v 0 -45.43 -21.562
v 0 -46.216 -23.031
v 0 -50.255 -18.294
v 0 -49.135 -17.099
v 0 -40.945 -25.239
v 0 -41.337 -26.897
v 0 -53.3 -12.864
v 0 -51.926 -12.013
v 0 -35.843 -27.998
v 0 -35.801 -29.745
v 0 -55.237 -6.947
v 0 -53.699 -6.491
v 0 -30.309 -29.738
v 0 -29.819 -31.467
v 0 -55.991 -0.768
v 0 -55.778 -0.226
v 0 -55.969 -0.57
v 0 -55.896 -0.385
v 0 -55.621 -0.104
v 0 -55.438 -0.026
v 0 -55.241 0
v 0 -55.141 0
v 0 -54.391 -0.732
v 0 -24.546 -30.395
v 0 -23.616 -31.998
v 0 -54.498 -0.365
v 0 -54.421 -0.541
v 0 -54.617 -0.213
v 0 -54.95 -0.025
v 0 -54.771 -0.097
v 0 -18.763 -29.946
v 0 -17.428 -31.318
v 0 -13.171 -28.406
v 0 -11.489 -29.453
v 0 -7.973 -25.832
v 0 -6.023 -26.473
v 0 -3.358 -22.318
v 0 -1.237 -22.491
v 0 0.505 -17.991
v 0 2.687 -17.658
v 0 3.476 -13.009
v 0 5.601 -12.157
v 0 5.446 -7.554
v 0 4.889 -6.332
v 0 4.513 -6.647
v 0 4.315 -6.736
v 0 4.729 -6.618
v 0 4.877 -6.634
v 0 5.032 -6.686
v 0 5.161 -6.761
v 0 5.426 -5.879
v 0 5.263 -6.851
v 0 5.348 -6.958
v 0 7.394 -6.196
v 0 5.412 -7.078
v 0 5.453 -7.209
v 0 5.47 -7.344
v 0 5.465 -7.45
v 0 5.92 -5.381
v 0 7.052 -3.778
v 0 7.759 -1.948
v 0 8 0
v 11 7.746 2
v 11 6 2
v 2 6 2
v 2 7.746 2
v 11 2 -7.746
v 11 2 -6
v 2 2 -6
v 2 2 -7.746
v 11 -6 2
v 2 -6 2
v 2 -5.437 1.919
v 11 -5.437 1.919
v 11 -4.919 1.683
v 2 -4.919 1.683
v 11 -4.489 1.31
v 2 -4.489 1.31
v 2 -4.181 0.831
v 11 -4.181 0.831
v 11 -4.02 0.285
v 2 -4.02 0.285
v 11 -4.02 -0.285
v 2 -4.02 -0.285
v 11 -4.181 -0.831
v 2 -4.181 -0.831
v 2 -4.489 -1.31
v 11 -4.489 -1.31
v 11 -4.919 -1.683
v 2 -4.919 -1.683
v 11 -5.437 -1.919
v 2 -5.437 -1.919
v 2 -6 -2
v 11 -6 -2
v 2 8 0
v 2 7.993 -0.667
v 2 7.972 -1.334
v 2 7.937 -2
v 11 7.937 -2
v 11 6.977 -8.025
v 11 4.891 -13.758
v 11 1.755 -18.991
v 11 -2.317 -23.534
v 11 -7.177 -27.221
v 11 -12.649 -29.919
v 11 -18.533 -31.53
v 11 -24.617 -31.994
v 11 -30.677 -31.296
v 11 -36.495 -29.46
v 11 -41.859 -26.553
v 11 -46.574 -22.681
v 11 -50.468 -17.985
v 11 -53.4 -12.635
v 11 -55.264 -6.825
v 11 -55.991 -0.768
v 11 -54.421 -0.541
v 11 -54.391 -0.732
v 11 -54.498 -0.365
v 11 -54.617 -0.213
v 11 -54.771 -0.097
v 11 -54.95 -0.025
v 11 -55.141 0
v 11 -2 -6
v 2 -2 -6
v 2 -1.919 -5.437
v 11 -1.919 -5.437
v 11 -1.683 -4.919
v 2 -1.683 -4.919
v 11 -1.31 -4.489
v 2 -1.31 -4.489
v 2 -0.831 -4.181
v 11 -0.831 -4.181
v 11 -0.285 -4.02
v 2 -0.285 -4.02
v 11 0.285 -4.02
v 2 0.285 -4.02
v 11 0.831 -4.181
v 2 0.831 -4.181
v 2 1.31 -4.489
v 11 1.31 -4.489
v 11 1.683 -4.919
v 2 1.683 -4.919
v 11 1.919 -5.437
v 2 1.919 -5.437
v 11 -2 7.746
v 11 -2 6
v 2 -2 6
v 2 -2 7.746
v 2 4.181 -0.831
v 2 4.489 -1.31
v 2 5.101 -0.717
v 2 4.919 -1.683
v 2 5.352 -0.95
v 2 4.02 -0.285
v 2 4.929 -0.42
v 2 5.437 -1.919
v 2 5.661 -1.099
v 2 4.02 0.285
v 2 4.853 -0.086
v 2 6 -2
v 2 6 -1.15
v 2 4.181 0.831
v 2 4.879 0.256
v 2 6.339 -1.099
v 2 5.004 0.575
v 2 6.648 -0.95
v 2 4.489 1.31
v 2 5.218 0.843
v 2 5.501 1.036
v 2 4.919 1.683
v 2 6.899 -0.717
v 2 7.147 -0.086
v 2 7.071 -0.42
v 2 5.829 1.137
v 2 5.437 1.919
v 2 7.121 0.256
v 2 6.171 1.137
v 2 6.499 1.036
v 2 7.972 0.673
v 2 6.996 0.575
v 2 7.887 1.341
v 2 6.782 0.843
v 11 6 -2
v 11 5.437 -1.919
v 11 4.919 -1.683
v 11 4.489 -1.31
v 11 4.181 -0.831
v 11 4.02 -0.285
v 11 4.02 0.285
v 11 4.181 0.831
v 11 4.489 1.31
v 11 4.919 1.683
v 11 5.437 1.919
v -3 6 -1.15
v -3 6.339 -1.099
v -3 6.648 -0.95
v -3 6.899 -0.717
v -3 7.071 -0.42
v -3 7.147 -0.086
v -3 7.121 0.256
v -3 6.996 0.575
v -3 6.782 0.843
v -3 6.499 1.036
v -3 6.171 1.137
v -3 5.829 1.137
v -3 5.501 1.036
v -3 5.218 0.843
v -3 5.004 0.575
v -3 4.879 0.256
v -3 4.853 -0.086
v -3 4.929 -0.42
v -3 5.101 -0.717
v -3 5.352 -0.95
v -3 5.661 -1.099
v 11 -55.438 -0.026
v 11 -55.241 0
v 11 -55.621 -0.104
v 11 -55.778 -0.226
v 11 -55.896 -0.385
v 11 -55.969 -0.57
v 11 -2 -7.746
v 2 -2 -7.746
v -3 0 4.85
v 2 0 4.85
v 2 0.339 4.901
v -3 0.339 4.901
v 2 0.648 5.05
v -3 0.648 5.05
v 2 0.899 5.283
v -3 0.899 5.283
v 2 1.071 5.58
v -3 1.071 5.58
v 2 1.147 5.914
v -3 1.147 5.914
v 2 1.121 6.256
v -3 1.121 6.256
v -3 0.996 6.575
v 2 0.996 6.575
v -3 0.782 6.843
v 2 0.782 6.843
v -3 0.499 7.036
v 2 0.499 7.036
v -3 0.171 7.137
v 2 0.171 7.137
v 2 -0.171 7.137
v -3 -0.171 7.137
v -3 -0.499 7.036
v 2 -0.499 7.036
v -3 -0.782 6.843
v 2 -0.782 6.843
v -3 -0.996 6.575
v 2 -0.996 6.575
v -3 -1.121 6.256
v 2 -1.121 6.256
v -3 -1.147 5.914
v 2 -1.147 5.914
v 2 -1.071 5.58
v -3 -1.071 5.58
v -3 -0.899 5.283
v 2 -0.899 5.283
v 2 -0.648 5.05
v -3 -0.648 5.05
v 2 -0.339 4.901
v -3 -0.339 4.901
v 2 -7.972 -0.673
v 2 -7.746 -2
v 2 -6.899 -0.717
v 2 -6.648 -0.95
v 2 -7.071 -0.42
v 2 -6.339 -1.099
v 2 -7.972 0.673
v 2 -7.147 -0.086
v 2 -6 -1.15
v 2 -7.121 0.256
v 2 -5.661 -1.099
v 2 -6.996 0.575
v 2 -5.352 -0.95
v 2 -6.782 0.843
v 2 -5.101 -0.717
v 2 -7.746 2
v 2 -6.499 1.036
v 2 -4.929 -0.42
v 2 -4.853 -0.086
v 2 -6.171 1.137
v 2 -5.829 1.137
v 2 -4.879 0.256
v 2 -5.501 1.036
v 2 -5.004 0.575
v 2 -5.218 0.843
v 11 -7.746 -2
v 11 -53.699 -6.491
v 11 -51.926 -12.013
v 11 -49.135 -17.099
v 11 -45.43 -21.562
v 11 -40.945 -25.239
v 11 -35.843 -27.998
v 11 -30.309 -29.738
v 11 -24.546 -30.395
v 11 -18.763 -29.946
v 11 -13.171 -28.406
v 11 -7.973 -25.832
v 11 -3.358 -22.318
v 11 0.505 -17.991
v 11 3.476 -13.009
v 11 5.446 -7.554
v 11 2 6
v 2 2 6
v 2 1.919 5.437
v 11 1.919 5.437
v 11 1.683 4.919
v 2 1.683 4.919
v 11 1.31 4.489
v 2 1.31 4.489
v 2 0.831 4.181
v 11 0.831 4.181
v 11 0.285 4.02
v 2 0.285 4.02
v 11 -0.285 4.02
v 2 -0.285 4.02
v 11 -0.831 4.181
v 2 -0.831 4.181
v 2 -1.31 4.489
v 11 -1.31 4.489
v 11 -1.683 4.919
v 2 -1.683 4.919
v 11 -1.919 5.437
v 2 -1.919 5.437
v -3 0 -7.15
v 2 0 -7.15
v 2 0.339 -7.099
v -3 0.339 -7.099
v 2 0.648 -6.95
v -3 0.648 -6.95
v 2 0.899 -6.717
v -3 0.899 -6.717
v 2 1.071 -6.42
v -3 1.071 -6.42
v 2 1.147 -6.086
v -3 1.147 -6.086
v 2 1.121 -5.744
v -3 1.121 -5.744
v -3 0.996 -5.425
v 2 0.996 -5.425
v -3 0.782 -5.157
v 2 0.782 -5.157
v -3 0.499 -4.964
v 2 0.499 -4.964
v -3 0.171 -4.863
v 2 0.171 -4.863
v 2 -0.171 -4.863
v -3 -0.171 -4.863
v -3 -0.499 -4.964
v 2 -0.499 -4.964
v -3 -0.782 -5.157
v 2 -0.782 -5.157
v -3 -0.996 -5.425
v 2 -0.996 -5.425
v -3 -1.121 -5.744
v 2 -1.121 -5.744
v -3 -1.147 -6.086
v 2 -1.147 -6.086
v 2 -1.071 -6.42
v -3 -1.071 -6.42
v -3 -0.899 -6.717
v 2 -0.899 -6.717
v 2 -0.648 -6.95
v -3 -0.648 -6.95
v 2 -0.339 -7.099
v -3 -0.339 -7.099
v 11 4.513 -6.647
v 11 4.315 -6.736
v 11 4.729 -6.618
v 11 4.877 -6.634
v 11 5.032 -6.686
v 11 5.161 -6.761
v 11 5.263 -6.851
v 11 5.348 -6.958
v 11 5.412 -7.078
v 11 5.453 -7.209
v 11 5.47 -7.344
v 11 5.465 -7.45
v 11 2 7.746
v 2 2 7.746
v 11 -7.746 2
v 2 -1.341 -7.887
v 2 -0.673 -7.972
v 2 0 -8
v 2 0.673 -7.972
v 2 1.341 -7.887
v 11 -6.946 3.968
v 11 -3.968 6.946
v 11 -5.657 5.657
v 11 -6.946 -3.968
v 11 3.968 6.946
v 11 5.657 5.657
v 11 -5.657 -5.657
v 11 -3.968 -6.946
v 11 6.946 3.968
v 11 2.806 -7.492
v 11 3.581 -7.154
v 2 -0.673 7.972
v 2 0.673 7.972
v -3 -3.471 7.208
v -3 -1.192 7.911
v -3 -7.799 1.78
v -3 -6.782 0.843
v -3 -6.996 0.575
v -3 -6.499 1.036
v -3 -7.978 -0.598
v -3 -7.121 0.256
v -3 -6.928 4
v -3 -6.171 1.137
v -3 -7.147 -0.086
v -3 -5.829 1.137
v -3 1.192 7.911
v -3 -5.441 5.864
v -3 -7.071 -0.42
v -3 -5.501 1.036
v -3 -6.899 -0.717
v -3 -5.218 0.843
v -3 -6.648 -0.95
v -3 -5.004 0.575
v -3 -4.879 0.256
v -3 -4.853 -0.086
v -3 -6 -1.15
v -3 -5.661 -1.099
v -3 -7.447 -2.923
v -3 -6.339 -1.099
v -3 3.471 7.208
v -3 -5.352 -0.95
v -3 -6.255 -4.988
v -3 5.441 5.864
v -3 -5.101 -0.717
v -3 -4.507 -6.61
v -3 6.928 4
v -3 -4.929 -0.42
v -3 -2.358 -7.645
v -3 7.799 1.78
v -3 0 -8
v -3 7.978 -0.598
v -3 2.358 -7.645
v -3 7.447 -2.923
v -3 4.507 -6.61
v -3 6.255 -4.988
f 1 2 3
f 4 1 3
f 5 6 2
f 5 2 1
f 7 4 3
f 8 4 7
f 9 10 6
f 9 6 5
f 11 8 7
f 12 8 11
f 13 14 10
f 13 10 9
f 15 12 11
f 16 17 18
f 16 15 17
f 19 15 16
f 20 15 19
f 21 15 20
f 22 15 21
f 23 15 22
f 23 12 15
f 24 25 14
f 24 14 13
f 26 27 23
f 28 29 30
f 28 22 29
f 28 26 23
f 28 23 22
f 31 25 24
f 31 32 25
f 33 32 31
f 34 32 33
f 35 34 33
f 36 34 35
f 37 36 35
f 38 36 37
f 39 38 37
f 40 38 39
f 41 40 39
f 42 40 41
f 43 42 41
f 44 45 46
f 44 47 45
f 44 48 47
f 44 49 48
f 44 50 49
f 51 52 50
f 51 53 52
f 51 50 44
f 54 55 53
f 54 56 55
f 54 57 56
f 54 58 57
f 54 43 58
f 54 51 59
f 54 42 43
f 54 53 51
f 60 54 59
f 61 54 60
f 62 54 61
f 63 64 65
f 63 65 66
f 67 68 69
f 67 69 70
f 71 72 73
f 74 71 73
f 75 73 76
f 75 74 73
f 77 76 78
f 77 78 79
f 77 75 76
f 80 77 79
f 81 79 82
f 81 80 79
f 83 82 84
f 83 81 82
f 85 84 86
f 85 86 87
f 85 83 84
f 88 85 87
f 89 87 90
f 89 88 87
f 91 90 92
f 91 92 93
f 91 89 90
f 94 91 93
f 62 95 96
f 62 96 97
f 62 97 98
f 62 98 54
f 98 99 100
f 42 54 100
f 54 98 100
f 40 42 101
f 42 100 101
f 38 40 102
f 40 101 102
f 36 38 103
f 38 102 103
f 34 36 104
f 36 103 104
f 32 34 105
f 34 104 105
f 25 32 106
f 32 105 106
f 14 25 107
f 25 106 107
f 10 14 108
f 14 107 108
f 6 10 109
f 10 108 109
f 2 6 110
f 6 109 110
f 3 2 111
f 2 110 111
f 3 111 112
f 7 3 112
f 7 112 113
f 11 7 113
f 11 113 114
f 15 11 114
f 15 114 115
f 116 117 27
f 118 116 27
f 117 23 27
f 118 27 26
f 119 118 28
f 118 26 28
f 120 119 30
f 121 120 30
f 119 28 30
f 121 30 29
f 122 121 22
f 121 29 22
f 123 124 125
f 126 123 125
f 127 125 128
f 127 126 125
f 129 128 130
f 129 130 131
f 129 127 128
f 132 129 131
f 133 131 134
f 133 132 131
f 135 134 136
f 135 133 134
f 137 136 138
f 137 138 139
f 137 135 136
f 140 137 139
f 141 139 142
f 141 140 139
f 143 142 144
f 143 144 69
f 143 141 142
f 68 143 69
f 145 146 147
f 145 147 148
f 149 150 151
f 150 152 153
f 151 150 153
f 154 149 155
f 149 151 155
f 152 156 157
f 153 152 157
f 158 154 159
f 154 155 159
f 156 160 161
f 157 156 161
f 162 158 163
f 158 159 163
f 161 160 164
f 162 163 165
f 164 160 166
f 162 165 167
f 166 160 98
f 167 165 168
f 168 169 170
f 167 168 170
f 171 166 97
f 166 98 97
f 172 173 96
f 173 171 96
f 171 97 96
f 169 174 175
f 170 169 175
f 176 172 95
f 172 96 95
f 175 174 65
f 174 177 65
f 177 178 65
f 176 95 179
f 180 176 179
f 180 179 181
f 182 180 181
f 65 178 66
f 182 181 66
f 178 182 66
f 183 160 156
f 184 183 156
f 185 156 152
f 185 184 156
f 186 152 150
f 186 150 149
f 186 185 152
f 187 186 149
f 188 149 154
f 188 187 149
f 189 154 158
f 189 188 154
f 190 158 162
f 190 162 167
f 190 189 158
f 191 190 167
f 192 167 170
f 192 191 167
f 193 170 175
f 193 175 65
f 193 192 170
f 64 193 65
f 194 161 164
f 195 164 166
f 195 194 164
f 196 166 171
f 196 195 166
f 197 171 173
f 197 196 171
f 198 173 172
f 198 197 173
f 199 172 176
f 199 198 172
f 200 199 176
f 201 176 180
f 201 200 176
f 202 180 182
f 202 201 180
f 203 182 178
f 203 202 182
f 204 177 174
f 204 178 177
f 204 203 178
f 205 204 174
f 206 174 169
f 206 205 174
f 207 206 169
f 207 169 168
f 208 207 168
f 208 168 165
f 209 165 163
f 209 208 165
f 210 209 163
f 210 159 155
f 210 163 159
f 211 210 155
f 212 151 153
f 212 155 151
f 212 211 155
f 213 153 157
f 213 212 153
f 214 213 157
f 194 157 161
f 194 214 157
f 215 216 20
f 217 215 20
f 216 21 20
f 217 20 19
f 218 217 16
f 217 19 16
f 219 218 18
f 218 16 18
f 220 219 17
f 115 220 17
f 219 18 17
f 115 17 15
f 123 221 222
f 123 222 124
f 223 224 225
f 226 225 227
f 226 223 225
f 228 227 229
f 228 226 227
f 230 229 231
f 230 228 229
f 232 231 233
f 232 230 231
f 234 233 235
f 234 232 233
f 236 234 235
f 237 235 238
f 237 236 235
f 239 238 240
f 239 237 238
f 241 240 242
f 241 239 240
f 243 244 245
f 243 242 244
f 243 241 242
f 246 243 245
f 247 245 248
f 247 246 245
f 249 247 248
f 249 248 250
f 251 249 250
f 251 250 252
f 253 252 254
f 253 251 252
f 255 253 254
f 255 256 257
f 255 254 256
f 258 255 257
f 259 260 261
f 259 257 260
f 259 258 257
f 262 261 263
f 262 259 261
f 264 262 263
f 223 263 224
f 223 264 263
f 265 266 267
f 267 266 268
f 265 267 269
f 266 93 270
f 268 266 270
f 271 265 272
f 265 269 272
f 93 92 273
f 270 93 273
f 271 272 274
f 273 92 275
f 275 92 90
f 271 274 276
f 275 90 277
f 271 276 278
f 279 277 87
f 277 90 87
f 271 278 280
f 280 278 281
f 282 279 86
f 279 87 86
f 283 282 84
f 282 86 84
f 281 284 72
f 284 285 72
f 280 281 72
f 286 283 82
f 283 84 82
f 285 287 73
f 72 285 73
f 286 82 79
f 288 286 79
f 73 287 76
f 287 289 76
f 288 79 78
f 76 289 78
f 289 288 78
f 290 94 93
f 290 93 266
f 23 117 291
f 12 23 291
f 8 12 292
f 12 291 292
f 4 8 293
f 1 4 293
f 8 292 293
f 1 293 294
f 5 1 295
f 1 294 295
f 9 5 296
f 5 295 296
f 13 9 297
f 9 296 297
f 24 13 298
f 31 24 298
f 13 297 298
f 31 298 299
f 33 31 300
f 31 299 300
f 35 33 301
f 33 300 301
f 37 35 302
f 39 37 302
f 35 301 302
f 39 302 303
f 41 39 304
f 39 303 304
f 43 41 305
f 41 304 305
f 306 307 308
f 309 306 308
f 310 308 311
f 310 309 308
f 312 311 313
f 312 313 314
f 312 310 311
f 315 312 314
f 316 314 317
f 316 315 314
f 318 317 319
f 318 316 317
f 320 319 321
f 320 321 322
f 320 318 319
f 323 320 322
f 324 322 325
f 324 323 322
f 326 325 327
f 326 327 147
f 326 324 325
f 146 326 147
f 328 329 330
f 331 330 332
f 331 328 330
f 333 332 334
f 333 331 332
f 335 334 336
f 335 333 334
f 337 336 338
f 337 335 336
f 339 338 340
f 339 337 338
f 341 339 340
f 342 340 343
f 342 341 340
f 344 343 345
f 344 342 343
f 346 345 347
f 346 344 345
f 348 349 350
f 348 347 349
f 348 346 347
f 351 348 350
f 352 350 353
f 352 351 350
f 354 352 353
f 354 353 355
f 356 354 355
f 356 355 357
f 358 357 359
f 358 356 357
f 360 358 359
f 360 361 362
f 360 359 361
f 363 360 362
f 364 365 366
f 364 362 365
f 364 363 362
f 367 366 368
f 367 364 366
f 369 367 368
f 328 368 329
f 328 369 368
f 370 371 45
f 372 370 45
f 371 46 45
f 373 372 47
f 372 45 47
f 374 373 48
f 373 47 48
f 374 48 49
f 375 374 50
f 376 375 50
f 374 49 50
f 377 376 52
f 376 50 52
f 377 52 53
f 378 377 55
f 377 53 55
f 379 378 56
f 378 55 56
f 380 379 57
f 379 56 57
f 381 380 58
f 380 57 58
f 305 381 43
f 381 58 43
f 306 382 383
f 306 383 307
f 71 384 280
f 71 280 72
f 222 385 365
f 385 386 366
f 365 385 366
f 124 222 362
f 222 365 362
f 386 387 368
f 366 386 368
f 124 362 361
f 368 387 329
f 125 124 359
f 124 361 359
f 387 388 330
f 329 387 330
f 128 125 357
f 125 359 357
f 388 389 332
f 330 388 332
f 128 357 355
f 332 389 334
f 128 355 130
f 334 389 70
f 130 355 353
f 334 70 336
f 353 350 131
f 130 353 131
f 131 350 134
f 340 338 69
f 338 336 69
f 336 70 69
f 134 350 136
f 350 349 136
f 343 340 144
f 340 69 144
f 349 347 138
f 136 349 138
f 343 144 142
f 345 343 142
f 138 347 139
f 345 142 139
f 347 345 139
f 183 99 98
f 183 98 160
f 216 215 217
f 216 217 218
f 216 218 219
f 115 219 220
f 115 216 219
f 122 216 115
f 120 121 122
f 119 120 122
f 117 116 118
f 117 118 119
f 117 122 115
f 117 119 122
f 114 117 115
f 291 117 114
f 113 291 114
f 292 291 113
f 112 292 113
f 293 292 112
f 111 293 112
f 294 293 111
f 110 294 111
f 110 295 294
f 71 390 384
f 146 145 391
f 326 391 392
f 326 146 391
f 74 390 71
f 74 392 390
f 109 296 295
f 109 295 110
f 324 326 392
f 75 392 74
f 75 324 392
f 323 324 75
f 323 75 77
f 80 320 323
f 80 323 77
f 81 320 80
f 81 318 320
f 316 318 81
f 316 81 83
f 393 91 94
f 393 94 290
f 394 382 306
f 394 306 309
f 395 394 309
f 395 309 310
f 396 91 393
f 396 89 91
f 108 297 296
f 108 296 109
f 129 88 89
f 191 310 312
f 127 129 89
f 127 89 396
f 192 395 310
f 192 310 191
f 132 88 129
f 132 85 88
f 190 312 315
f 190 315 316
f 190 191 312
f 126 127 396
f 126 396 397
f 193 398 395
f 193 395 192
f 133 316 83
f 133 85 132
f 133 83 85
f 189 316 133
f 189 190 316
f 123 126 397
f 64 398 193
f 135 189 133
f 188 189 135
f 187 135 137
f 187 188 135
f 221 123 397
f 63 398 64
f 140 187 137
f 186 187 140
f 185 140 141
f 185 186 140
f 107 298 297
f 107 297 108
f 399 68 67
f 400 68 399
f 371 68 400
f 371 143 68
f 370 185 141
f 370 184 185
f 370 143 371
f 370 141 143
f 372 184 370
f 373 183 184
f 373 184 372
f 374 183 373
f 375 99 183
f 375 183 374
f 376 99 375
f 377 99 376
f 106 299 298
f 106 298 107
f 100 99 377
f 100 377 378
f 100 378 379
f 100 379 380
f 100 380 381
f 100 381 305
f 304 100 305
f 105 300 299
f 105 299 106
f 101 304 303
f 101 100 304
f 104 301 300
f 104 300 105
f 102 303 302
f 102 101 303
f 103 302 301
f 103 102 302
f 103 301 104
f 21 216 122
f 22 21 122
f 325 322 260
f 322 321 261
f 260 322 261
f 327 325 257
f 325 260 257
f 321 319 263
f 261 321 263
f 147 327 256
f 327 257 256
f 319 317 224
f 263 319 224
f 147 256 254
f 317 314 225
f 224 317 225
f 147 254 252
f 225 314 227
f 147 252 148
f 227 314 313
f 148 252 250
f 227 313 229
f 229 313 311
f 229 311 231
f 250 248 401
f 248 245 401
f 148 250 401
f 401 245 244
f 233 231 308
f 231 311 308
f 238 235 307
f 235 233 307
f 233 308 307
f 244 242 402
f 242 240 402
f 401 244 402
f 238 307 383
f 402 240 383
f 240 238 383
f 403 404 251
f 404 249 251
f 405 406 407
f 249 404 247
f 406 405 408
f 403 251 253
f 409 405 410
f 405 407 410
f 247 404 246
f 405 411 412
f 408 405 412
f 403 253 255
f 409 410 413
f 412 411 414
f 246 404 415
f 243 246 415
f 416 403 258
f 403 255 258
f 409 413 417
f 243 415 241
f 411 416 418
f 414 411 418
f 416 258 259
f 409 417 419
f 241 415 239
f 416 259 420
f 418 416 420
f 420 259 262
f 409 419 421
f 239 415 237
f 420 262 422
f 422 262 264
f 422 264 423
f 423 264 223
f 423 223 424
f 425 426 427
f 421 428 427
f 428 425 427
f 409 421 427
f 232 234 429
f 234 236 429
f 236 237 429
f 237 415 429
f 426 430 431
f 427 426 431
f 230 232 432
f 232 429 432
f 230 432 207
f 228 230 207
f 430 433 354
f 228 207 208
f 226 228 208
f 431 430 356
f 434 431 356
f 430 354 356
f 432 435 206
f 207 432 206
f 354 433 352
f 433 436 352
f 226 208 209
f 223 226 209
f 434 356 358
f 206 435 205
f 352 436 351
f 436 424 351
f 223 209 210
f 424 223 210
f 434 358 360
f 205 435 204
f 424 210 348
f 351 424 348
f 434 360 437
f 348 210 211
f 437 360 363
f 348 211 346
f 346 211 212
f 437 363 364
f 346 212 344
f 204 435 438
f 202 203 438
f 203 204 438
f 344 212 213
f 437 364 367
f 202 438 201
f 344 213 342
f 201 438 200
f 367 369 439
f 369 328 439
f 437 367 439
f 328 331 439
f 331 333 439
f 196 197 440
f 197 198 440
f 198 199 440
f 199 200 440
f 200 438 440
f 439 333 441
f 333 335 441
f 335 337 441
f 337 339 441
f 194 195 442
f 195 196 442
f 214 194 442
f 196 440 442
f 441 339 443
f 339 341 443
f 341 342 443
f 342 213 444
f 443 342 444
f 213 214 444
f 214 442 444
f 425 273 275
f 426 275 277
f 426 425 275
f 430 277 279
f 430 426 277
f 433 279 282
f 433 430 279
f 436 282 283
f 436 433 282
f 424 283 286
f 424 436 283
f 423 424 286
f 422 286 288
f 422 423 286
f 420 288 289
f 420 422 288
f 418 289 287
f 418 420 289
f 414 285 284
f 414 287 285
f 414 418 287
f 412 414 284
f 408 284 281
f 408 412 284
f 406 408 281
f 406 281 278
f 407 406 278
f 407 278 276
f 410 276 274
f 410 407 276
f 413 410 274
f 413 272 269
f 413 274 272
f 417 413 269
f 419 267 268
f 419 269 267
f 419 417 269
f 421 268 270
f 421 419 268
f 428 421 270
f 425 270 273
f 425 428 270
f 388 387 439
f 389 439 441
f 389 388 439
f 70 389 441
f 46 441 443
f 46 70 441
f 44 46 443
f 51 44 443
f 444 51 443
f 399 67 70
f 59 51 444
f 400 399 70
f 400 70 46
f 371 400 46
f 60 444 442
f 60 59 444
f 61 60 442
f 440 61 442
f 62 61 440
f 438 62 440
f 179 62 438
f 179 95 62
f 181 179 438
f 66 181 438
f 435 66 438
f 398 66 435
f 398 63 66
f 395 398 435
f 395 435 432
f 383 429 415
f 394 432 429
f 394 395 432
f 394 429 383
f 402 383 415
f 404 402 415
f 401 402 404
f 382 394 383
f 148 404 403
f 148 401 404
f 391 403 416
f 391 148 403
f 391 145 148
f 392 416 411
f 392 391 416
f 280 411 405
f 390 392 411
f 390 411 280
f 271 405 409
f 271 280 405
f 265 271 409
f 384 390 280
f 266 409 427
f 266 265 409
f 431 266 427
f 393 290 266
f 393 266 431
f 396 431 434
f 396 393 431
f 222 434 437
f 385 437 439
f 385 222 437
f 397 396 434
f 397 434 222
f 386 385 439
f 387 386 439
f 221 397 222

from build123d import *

# Parameters (mm, degrees)
HUB_SKETCH_R    = 8
HUB_SKETCH_R_2  = 1.15
HUB_DEPTH       = 11
HUB_DEPTH_BACK  = 3
LEG_DEPTH       = 11
CLEARANCE_DEPTH = 9
FILLET_2_R      = 0.75


with BuildPart() as part:
    # Hub-Sketch → Hub (new body, two sides)
    with BuildSketch(Plane(origin=(0, 0, 0), x_dir=(0, 0, -1), z_dir=(1, 0, 0))) as hub_sk:
        Circle(HUB_SKETCH_R)
        with Locations((0, 6)):
            Circle(HUB_SKETCH_R_2, mode=Mode.SUBTRACT)
        with Locations((-6, 0)):
            Circle(HUB_SKETCH_R_2, mode=Mode.SUBTRACT)
        with Locations((0, -6)):
            Circle(HUB_SKETCH_R_2, mode=Mode.SUBTRACT)
        with Locations((6, 0)):
            Circle(HUB_SKETCH_R_2, mode=Mode.SUBTRACT)
    extrude(amount=HUB_DEPTH)
    extrude(hub_sk.sketch, amount=-HUB_DEPTH_BACK)

    # Leg-Sketch → Leg (add)
    with BuildSketch(Plane(origin=(11, 0, 0), x_dir=(0, 0, -1), z_dir=(1, 0, 0))):
        with BuildLine():
            Line((0, -56), (0, -54.4))
            ThreePointArc((0, -54.4), (30.279762218, -26.701110883), (5.380854951, 5.92))
            ThreePointArc((5.380854951, 5.92), (2.88444102, 7.461903242), (0, 8))
            ThreePointArc((0, 8), (32, -24), (0, -56))
        make_face()
    extrude(amount=-LEG_DEPTH)

    # Clearance-Sketch → Clearance (cut)
    with BuildSketch(Plane(origin=(11, 0, 0), x_dir=(0, 0, -1), z_dir=(1, 0, 0))):
        with BuildLine():
            Line((-2, 8), (2, 8))
            Line((2, 8), (2, 6))
            ThreePointArc((2, 6), (0, 4), (-2, 6))
            Line((-2, 6), (-2, 8))
        make_face()
        with BuildLine():
            Line((8, 2), (8, -2))
            Line((8, -2), (6, -2))
            ThreePointArc((6, -2), (4, 0), (6, 2))
            Line((6, 2), (8, 2))
        make_face()
        with BuildLine():
            Line((2, -8), (-2, -8))
            Line((-2, -8), (-2, -6))
            ThreePointArc((-2, -6), (0, -4), (2, -6))
            Line((2, -6), (2, -8))
        make_face()
        with BuildLine():
            Line((-8, -2), (-8, 2))
            Line((-8, 2), (-6, 2))
            ThreePointArc((-6, 2), (-4, 0), (-6, -2))
            Line((-6, -2), (-8, -2))
        make_face()
    extrude(amount=-CLEARANCE_DEPTH, mode=Mode.SUBTRACT)

    # Fillet 2
    fillet_2_edges = [part.edges().sort_by_distance(p)[0] for p in [
        (5.5, 5.92, -5.380854951),
        (5.5, -56, 0),
        (5.5, -54.4, 0),
    ]]
    fillet(fillet_2_edges, radius=FILLET_2_R)


solid = part.part
